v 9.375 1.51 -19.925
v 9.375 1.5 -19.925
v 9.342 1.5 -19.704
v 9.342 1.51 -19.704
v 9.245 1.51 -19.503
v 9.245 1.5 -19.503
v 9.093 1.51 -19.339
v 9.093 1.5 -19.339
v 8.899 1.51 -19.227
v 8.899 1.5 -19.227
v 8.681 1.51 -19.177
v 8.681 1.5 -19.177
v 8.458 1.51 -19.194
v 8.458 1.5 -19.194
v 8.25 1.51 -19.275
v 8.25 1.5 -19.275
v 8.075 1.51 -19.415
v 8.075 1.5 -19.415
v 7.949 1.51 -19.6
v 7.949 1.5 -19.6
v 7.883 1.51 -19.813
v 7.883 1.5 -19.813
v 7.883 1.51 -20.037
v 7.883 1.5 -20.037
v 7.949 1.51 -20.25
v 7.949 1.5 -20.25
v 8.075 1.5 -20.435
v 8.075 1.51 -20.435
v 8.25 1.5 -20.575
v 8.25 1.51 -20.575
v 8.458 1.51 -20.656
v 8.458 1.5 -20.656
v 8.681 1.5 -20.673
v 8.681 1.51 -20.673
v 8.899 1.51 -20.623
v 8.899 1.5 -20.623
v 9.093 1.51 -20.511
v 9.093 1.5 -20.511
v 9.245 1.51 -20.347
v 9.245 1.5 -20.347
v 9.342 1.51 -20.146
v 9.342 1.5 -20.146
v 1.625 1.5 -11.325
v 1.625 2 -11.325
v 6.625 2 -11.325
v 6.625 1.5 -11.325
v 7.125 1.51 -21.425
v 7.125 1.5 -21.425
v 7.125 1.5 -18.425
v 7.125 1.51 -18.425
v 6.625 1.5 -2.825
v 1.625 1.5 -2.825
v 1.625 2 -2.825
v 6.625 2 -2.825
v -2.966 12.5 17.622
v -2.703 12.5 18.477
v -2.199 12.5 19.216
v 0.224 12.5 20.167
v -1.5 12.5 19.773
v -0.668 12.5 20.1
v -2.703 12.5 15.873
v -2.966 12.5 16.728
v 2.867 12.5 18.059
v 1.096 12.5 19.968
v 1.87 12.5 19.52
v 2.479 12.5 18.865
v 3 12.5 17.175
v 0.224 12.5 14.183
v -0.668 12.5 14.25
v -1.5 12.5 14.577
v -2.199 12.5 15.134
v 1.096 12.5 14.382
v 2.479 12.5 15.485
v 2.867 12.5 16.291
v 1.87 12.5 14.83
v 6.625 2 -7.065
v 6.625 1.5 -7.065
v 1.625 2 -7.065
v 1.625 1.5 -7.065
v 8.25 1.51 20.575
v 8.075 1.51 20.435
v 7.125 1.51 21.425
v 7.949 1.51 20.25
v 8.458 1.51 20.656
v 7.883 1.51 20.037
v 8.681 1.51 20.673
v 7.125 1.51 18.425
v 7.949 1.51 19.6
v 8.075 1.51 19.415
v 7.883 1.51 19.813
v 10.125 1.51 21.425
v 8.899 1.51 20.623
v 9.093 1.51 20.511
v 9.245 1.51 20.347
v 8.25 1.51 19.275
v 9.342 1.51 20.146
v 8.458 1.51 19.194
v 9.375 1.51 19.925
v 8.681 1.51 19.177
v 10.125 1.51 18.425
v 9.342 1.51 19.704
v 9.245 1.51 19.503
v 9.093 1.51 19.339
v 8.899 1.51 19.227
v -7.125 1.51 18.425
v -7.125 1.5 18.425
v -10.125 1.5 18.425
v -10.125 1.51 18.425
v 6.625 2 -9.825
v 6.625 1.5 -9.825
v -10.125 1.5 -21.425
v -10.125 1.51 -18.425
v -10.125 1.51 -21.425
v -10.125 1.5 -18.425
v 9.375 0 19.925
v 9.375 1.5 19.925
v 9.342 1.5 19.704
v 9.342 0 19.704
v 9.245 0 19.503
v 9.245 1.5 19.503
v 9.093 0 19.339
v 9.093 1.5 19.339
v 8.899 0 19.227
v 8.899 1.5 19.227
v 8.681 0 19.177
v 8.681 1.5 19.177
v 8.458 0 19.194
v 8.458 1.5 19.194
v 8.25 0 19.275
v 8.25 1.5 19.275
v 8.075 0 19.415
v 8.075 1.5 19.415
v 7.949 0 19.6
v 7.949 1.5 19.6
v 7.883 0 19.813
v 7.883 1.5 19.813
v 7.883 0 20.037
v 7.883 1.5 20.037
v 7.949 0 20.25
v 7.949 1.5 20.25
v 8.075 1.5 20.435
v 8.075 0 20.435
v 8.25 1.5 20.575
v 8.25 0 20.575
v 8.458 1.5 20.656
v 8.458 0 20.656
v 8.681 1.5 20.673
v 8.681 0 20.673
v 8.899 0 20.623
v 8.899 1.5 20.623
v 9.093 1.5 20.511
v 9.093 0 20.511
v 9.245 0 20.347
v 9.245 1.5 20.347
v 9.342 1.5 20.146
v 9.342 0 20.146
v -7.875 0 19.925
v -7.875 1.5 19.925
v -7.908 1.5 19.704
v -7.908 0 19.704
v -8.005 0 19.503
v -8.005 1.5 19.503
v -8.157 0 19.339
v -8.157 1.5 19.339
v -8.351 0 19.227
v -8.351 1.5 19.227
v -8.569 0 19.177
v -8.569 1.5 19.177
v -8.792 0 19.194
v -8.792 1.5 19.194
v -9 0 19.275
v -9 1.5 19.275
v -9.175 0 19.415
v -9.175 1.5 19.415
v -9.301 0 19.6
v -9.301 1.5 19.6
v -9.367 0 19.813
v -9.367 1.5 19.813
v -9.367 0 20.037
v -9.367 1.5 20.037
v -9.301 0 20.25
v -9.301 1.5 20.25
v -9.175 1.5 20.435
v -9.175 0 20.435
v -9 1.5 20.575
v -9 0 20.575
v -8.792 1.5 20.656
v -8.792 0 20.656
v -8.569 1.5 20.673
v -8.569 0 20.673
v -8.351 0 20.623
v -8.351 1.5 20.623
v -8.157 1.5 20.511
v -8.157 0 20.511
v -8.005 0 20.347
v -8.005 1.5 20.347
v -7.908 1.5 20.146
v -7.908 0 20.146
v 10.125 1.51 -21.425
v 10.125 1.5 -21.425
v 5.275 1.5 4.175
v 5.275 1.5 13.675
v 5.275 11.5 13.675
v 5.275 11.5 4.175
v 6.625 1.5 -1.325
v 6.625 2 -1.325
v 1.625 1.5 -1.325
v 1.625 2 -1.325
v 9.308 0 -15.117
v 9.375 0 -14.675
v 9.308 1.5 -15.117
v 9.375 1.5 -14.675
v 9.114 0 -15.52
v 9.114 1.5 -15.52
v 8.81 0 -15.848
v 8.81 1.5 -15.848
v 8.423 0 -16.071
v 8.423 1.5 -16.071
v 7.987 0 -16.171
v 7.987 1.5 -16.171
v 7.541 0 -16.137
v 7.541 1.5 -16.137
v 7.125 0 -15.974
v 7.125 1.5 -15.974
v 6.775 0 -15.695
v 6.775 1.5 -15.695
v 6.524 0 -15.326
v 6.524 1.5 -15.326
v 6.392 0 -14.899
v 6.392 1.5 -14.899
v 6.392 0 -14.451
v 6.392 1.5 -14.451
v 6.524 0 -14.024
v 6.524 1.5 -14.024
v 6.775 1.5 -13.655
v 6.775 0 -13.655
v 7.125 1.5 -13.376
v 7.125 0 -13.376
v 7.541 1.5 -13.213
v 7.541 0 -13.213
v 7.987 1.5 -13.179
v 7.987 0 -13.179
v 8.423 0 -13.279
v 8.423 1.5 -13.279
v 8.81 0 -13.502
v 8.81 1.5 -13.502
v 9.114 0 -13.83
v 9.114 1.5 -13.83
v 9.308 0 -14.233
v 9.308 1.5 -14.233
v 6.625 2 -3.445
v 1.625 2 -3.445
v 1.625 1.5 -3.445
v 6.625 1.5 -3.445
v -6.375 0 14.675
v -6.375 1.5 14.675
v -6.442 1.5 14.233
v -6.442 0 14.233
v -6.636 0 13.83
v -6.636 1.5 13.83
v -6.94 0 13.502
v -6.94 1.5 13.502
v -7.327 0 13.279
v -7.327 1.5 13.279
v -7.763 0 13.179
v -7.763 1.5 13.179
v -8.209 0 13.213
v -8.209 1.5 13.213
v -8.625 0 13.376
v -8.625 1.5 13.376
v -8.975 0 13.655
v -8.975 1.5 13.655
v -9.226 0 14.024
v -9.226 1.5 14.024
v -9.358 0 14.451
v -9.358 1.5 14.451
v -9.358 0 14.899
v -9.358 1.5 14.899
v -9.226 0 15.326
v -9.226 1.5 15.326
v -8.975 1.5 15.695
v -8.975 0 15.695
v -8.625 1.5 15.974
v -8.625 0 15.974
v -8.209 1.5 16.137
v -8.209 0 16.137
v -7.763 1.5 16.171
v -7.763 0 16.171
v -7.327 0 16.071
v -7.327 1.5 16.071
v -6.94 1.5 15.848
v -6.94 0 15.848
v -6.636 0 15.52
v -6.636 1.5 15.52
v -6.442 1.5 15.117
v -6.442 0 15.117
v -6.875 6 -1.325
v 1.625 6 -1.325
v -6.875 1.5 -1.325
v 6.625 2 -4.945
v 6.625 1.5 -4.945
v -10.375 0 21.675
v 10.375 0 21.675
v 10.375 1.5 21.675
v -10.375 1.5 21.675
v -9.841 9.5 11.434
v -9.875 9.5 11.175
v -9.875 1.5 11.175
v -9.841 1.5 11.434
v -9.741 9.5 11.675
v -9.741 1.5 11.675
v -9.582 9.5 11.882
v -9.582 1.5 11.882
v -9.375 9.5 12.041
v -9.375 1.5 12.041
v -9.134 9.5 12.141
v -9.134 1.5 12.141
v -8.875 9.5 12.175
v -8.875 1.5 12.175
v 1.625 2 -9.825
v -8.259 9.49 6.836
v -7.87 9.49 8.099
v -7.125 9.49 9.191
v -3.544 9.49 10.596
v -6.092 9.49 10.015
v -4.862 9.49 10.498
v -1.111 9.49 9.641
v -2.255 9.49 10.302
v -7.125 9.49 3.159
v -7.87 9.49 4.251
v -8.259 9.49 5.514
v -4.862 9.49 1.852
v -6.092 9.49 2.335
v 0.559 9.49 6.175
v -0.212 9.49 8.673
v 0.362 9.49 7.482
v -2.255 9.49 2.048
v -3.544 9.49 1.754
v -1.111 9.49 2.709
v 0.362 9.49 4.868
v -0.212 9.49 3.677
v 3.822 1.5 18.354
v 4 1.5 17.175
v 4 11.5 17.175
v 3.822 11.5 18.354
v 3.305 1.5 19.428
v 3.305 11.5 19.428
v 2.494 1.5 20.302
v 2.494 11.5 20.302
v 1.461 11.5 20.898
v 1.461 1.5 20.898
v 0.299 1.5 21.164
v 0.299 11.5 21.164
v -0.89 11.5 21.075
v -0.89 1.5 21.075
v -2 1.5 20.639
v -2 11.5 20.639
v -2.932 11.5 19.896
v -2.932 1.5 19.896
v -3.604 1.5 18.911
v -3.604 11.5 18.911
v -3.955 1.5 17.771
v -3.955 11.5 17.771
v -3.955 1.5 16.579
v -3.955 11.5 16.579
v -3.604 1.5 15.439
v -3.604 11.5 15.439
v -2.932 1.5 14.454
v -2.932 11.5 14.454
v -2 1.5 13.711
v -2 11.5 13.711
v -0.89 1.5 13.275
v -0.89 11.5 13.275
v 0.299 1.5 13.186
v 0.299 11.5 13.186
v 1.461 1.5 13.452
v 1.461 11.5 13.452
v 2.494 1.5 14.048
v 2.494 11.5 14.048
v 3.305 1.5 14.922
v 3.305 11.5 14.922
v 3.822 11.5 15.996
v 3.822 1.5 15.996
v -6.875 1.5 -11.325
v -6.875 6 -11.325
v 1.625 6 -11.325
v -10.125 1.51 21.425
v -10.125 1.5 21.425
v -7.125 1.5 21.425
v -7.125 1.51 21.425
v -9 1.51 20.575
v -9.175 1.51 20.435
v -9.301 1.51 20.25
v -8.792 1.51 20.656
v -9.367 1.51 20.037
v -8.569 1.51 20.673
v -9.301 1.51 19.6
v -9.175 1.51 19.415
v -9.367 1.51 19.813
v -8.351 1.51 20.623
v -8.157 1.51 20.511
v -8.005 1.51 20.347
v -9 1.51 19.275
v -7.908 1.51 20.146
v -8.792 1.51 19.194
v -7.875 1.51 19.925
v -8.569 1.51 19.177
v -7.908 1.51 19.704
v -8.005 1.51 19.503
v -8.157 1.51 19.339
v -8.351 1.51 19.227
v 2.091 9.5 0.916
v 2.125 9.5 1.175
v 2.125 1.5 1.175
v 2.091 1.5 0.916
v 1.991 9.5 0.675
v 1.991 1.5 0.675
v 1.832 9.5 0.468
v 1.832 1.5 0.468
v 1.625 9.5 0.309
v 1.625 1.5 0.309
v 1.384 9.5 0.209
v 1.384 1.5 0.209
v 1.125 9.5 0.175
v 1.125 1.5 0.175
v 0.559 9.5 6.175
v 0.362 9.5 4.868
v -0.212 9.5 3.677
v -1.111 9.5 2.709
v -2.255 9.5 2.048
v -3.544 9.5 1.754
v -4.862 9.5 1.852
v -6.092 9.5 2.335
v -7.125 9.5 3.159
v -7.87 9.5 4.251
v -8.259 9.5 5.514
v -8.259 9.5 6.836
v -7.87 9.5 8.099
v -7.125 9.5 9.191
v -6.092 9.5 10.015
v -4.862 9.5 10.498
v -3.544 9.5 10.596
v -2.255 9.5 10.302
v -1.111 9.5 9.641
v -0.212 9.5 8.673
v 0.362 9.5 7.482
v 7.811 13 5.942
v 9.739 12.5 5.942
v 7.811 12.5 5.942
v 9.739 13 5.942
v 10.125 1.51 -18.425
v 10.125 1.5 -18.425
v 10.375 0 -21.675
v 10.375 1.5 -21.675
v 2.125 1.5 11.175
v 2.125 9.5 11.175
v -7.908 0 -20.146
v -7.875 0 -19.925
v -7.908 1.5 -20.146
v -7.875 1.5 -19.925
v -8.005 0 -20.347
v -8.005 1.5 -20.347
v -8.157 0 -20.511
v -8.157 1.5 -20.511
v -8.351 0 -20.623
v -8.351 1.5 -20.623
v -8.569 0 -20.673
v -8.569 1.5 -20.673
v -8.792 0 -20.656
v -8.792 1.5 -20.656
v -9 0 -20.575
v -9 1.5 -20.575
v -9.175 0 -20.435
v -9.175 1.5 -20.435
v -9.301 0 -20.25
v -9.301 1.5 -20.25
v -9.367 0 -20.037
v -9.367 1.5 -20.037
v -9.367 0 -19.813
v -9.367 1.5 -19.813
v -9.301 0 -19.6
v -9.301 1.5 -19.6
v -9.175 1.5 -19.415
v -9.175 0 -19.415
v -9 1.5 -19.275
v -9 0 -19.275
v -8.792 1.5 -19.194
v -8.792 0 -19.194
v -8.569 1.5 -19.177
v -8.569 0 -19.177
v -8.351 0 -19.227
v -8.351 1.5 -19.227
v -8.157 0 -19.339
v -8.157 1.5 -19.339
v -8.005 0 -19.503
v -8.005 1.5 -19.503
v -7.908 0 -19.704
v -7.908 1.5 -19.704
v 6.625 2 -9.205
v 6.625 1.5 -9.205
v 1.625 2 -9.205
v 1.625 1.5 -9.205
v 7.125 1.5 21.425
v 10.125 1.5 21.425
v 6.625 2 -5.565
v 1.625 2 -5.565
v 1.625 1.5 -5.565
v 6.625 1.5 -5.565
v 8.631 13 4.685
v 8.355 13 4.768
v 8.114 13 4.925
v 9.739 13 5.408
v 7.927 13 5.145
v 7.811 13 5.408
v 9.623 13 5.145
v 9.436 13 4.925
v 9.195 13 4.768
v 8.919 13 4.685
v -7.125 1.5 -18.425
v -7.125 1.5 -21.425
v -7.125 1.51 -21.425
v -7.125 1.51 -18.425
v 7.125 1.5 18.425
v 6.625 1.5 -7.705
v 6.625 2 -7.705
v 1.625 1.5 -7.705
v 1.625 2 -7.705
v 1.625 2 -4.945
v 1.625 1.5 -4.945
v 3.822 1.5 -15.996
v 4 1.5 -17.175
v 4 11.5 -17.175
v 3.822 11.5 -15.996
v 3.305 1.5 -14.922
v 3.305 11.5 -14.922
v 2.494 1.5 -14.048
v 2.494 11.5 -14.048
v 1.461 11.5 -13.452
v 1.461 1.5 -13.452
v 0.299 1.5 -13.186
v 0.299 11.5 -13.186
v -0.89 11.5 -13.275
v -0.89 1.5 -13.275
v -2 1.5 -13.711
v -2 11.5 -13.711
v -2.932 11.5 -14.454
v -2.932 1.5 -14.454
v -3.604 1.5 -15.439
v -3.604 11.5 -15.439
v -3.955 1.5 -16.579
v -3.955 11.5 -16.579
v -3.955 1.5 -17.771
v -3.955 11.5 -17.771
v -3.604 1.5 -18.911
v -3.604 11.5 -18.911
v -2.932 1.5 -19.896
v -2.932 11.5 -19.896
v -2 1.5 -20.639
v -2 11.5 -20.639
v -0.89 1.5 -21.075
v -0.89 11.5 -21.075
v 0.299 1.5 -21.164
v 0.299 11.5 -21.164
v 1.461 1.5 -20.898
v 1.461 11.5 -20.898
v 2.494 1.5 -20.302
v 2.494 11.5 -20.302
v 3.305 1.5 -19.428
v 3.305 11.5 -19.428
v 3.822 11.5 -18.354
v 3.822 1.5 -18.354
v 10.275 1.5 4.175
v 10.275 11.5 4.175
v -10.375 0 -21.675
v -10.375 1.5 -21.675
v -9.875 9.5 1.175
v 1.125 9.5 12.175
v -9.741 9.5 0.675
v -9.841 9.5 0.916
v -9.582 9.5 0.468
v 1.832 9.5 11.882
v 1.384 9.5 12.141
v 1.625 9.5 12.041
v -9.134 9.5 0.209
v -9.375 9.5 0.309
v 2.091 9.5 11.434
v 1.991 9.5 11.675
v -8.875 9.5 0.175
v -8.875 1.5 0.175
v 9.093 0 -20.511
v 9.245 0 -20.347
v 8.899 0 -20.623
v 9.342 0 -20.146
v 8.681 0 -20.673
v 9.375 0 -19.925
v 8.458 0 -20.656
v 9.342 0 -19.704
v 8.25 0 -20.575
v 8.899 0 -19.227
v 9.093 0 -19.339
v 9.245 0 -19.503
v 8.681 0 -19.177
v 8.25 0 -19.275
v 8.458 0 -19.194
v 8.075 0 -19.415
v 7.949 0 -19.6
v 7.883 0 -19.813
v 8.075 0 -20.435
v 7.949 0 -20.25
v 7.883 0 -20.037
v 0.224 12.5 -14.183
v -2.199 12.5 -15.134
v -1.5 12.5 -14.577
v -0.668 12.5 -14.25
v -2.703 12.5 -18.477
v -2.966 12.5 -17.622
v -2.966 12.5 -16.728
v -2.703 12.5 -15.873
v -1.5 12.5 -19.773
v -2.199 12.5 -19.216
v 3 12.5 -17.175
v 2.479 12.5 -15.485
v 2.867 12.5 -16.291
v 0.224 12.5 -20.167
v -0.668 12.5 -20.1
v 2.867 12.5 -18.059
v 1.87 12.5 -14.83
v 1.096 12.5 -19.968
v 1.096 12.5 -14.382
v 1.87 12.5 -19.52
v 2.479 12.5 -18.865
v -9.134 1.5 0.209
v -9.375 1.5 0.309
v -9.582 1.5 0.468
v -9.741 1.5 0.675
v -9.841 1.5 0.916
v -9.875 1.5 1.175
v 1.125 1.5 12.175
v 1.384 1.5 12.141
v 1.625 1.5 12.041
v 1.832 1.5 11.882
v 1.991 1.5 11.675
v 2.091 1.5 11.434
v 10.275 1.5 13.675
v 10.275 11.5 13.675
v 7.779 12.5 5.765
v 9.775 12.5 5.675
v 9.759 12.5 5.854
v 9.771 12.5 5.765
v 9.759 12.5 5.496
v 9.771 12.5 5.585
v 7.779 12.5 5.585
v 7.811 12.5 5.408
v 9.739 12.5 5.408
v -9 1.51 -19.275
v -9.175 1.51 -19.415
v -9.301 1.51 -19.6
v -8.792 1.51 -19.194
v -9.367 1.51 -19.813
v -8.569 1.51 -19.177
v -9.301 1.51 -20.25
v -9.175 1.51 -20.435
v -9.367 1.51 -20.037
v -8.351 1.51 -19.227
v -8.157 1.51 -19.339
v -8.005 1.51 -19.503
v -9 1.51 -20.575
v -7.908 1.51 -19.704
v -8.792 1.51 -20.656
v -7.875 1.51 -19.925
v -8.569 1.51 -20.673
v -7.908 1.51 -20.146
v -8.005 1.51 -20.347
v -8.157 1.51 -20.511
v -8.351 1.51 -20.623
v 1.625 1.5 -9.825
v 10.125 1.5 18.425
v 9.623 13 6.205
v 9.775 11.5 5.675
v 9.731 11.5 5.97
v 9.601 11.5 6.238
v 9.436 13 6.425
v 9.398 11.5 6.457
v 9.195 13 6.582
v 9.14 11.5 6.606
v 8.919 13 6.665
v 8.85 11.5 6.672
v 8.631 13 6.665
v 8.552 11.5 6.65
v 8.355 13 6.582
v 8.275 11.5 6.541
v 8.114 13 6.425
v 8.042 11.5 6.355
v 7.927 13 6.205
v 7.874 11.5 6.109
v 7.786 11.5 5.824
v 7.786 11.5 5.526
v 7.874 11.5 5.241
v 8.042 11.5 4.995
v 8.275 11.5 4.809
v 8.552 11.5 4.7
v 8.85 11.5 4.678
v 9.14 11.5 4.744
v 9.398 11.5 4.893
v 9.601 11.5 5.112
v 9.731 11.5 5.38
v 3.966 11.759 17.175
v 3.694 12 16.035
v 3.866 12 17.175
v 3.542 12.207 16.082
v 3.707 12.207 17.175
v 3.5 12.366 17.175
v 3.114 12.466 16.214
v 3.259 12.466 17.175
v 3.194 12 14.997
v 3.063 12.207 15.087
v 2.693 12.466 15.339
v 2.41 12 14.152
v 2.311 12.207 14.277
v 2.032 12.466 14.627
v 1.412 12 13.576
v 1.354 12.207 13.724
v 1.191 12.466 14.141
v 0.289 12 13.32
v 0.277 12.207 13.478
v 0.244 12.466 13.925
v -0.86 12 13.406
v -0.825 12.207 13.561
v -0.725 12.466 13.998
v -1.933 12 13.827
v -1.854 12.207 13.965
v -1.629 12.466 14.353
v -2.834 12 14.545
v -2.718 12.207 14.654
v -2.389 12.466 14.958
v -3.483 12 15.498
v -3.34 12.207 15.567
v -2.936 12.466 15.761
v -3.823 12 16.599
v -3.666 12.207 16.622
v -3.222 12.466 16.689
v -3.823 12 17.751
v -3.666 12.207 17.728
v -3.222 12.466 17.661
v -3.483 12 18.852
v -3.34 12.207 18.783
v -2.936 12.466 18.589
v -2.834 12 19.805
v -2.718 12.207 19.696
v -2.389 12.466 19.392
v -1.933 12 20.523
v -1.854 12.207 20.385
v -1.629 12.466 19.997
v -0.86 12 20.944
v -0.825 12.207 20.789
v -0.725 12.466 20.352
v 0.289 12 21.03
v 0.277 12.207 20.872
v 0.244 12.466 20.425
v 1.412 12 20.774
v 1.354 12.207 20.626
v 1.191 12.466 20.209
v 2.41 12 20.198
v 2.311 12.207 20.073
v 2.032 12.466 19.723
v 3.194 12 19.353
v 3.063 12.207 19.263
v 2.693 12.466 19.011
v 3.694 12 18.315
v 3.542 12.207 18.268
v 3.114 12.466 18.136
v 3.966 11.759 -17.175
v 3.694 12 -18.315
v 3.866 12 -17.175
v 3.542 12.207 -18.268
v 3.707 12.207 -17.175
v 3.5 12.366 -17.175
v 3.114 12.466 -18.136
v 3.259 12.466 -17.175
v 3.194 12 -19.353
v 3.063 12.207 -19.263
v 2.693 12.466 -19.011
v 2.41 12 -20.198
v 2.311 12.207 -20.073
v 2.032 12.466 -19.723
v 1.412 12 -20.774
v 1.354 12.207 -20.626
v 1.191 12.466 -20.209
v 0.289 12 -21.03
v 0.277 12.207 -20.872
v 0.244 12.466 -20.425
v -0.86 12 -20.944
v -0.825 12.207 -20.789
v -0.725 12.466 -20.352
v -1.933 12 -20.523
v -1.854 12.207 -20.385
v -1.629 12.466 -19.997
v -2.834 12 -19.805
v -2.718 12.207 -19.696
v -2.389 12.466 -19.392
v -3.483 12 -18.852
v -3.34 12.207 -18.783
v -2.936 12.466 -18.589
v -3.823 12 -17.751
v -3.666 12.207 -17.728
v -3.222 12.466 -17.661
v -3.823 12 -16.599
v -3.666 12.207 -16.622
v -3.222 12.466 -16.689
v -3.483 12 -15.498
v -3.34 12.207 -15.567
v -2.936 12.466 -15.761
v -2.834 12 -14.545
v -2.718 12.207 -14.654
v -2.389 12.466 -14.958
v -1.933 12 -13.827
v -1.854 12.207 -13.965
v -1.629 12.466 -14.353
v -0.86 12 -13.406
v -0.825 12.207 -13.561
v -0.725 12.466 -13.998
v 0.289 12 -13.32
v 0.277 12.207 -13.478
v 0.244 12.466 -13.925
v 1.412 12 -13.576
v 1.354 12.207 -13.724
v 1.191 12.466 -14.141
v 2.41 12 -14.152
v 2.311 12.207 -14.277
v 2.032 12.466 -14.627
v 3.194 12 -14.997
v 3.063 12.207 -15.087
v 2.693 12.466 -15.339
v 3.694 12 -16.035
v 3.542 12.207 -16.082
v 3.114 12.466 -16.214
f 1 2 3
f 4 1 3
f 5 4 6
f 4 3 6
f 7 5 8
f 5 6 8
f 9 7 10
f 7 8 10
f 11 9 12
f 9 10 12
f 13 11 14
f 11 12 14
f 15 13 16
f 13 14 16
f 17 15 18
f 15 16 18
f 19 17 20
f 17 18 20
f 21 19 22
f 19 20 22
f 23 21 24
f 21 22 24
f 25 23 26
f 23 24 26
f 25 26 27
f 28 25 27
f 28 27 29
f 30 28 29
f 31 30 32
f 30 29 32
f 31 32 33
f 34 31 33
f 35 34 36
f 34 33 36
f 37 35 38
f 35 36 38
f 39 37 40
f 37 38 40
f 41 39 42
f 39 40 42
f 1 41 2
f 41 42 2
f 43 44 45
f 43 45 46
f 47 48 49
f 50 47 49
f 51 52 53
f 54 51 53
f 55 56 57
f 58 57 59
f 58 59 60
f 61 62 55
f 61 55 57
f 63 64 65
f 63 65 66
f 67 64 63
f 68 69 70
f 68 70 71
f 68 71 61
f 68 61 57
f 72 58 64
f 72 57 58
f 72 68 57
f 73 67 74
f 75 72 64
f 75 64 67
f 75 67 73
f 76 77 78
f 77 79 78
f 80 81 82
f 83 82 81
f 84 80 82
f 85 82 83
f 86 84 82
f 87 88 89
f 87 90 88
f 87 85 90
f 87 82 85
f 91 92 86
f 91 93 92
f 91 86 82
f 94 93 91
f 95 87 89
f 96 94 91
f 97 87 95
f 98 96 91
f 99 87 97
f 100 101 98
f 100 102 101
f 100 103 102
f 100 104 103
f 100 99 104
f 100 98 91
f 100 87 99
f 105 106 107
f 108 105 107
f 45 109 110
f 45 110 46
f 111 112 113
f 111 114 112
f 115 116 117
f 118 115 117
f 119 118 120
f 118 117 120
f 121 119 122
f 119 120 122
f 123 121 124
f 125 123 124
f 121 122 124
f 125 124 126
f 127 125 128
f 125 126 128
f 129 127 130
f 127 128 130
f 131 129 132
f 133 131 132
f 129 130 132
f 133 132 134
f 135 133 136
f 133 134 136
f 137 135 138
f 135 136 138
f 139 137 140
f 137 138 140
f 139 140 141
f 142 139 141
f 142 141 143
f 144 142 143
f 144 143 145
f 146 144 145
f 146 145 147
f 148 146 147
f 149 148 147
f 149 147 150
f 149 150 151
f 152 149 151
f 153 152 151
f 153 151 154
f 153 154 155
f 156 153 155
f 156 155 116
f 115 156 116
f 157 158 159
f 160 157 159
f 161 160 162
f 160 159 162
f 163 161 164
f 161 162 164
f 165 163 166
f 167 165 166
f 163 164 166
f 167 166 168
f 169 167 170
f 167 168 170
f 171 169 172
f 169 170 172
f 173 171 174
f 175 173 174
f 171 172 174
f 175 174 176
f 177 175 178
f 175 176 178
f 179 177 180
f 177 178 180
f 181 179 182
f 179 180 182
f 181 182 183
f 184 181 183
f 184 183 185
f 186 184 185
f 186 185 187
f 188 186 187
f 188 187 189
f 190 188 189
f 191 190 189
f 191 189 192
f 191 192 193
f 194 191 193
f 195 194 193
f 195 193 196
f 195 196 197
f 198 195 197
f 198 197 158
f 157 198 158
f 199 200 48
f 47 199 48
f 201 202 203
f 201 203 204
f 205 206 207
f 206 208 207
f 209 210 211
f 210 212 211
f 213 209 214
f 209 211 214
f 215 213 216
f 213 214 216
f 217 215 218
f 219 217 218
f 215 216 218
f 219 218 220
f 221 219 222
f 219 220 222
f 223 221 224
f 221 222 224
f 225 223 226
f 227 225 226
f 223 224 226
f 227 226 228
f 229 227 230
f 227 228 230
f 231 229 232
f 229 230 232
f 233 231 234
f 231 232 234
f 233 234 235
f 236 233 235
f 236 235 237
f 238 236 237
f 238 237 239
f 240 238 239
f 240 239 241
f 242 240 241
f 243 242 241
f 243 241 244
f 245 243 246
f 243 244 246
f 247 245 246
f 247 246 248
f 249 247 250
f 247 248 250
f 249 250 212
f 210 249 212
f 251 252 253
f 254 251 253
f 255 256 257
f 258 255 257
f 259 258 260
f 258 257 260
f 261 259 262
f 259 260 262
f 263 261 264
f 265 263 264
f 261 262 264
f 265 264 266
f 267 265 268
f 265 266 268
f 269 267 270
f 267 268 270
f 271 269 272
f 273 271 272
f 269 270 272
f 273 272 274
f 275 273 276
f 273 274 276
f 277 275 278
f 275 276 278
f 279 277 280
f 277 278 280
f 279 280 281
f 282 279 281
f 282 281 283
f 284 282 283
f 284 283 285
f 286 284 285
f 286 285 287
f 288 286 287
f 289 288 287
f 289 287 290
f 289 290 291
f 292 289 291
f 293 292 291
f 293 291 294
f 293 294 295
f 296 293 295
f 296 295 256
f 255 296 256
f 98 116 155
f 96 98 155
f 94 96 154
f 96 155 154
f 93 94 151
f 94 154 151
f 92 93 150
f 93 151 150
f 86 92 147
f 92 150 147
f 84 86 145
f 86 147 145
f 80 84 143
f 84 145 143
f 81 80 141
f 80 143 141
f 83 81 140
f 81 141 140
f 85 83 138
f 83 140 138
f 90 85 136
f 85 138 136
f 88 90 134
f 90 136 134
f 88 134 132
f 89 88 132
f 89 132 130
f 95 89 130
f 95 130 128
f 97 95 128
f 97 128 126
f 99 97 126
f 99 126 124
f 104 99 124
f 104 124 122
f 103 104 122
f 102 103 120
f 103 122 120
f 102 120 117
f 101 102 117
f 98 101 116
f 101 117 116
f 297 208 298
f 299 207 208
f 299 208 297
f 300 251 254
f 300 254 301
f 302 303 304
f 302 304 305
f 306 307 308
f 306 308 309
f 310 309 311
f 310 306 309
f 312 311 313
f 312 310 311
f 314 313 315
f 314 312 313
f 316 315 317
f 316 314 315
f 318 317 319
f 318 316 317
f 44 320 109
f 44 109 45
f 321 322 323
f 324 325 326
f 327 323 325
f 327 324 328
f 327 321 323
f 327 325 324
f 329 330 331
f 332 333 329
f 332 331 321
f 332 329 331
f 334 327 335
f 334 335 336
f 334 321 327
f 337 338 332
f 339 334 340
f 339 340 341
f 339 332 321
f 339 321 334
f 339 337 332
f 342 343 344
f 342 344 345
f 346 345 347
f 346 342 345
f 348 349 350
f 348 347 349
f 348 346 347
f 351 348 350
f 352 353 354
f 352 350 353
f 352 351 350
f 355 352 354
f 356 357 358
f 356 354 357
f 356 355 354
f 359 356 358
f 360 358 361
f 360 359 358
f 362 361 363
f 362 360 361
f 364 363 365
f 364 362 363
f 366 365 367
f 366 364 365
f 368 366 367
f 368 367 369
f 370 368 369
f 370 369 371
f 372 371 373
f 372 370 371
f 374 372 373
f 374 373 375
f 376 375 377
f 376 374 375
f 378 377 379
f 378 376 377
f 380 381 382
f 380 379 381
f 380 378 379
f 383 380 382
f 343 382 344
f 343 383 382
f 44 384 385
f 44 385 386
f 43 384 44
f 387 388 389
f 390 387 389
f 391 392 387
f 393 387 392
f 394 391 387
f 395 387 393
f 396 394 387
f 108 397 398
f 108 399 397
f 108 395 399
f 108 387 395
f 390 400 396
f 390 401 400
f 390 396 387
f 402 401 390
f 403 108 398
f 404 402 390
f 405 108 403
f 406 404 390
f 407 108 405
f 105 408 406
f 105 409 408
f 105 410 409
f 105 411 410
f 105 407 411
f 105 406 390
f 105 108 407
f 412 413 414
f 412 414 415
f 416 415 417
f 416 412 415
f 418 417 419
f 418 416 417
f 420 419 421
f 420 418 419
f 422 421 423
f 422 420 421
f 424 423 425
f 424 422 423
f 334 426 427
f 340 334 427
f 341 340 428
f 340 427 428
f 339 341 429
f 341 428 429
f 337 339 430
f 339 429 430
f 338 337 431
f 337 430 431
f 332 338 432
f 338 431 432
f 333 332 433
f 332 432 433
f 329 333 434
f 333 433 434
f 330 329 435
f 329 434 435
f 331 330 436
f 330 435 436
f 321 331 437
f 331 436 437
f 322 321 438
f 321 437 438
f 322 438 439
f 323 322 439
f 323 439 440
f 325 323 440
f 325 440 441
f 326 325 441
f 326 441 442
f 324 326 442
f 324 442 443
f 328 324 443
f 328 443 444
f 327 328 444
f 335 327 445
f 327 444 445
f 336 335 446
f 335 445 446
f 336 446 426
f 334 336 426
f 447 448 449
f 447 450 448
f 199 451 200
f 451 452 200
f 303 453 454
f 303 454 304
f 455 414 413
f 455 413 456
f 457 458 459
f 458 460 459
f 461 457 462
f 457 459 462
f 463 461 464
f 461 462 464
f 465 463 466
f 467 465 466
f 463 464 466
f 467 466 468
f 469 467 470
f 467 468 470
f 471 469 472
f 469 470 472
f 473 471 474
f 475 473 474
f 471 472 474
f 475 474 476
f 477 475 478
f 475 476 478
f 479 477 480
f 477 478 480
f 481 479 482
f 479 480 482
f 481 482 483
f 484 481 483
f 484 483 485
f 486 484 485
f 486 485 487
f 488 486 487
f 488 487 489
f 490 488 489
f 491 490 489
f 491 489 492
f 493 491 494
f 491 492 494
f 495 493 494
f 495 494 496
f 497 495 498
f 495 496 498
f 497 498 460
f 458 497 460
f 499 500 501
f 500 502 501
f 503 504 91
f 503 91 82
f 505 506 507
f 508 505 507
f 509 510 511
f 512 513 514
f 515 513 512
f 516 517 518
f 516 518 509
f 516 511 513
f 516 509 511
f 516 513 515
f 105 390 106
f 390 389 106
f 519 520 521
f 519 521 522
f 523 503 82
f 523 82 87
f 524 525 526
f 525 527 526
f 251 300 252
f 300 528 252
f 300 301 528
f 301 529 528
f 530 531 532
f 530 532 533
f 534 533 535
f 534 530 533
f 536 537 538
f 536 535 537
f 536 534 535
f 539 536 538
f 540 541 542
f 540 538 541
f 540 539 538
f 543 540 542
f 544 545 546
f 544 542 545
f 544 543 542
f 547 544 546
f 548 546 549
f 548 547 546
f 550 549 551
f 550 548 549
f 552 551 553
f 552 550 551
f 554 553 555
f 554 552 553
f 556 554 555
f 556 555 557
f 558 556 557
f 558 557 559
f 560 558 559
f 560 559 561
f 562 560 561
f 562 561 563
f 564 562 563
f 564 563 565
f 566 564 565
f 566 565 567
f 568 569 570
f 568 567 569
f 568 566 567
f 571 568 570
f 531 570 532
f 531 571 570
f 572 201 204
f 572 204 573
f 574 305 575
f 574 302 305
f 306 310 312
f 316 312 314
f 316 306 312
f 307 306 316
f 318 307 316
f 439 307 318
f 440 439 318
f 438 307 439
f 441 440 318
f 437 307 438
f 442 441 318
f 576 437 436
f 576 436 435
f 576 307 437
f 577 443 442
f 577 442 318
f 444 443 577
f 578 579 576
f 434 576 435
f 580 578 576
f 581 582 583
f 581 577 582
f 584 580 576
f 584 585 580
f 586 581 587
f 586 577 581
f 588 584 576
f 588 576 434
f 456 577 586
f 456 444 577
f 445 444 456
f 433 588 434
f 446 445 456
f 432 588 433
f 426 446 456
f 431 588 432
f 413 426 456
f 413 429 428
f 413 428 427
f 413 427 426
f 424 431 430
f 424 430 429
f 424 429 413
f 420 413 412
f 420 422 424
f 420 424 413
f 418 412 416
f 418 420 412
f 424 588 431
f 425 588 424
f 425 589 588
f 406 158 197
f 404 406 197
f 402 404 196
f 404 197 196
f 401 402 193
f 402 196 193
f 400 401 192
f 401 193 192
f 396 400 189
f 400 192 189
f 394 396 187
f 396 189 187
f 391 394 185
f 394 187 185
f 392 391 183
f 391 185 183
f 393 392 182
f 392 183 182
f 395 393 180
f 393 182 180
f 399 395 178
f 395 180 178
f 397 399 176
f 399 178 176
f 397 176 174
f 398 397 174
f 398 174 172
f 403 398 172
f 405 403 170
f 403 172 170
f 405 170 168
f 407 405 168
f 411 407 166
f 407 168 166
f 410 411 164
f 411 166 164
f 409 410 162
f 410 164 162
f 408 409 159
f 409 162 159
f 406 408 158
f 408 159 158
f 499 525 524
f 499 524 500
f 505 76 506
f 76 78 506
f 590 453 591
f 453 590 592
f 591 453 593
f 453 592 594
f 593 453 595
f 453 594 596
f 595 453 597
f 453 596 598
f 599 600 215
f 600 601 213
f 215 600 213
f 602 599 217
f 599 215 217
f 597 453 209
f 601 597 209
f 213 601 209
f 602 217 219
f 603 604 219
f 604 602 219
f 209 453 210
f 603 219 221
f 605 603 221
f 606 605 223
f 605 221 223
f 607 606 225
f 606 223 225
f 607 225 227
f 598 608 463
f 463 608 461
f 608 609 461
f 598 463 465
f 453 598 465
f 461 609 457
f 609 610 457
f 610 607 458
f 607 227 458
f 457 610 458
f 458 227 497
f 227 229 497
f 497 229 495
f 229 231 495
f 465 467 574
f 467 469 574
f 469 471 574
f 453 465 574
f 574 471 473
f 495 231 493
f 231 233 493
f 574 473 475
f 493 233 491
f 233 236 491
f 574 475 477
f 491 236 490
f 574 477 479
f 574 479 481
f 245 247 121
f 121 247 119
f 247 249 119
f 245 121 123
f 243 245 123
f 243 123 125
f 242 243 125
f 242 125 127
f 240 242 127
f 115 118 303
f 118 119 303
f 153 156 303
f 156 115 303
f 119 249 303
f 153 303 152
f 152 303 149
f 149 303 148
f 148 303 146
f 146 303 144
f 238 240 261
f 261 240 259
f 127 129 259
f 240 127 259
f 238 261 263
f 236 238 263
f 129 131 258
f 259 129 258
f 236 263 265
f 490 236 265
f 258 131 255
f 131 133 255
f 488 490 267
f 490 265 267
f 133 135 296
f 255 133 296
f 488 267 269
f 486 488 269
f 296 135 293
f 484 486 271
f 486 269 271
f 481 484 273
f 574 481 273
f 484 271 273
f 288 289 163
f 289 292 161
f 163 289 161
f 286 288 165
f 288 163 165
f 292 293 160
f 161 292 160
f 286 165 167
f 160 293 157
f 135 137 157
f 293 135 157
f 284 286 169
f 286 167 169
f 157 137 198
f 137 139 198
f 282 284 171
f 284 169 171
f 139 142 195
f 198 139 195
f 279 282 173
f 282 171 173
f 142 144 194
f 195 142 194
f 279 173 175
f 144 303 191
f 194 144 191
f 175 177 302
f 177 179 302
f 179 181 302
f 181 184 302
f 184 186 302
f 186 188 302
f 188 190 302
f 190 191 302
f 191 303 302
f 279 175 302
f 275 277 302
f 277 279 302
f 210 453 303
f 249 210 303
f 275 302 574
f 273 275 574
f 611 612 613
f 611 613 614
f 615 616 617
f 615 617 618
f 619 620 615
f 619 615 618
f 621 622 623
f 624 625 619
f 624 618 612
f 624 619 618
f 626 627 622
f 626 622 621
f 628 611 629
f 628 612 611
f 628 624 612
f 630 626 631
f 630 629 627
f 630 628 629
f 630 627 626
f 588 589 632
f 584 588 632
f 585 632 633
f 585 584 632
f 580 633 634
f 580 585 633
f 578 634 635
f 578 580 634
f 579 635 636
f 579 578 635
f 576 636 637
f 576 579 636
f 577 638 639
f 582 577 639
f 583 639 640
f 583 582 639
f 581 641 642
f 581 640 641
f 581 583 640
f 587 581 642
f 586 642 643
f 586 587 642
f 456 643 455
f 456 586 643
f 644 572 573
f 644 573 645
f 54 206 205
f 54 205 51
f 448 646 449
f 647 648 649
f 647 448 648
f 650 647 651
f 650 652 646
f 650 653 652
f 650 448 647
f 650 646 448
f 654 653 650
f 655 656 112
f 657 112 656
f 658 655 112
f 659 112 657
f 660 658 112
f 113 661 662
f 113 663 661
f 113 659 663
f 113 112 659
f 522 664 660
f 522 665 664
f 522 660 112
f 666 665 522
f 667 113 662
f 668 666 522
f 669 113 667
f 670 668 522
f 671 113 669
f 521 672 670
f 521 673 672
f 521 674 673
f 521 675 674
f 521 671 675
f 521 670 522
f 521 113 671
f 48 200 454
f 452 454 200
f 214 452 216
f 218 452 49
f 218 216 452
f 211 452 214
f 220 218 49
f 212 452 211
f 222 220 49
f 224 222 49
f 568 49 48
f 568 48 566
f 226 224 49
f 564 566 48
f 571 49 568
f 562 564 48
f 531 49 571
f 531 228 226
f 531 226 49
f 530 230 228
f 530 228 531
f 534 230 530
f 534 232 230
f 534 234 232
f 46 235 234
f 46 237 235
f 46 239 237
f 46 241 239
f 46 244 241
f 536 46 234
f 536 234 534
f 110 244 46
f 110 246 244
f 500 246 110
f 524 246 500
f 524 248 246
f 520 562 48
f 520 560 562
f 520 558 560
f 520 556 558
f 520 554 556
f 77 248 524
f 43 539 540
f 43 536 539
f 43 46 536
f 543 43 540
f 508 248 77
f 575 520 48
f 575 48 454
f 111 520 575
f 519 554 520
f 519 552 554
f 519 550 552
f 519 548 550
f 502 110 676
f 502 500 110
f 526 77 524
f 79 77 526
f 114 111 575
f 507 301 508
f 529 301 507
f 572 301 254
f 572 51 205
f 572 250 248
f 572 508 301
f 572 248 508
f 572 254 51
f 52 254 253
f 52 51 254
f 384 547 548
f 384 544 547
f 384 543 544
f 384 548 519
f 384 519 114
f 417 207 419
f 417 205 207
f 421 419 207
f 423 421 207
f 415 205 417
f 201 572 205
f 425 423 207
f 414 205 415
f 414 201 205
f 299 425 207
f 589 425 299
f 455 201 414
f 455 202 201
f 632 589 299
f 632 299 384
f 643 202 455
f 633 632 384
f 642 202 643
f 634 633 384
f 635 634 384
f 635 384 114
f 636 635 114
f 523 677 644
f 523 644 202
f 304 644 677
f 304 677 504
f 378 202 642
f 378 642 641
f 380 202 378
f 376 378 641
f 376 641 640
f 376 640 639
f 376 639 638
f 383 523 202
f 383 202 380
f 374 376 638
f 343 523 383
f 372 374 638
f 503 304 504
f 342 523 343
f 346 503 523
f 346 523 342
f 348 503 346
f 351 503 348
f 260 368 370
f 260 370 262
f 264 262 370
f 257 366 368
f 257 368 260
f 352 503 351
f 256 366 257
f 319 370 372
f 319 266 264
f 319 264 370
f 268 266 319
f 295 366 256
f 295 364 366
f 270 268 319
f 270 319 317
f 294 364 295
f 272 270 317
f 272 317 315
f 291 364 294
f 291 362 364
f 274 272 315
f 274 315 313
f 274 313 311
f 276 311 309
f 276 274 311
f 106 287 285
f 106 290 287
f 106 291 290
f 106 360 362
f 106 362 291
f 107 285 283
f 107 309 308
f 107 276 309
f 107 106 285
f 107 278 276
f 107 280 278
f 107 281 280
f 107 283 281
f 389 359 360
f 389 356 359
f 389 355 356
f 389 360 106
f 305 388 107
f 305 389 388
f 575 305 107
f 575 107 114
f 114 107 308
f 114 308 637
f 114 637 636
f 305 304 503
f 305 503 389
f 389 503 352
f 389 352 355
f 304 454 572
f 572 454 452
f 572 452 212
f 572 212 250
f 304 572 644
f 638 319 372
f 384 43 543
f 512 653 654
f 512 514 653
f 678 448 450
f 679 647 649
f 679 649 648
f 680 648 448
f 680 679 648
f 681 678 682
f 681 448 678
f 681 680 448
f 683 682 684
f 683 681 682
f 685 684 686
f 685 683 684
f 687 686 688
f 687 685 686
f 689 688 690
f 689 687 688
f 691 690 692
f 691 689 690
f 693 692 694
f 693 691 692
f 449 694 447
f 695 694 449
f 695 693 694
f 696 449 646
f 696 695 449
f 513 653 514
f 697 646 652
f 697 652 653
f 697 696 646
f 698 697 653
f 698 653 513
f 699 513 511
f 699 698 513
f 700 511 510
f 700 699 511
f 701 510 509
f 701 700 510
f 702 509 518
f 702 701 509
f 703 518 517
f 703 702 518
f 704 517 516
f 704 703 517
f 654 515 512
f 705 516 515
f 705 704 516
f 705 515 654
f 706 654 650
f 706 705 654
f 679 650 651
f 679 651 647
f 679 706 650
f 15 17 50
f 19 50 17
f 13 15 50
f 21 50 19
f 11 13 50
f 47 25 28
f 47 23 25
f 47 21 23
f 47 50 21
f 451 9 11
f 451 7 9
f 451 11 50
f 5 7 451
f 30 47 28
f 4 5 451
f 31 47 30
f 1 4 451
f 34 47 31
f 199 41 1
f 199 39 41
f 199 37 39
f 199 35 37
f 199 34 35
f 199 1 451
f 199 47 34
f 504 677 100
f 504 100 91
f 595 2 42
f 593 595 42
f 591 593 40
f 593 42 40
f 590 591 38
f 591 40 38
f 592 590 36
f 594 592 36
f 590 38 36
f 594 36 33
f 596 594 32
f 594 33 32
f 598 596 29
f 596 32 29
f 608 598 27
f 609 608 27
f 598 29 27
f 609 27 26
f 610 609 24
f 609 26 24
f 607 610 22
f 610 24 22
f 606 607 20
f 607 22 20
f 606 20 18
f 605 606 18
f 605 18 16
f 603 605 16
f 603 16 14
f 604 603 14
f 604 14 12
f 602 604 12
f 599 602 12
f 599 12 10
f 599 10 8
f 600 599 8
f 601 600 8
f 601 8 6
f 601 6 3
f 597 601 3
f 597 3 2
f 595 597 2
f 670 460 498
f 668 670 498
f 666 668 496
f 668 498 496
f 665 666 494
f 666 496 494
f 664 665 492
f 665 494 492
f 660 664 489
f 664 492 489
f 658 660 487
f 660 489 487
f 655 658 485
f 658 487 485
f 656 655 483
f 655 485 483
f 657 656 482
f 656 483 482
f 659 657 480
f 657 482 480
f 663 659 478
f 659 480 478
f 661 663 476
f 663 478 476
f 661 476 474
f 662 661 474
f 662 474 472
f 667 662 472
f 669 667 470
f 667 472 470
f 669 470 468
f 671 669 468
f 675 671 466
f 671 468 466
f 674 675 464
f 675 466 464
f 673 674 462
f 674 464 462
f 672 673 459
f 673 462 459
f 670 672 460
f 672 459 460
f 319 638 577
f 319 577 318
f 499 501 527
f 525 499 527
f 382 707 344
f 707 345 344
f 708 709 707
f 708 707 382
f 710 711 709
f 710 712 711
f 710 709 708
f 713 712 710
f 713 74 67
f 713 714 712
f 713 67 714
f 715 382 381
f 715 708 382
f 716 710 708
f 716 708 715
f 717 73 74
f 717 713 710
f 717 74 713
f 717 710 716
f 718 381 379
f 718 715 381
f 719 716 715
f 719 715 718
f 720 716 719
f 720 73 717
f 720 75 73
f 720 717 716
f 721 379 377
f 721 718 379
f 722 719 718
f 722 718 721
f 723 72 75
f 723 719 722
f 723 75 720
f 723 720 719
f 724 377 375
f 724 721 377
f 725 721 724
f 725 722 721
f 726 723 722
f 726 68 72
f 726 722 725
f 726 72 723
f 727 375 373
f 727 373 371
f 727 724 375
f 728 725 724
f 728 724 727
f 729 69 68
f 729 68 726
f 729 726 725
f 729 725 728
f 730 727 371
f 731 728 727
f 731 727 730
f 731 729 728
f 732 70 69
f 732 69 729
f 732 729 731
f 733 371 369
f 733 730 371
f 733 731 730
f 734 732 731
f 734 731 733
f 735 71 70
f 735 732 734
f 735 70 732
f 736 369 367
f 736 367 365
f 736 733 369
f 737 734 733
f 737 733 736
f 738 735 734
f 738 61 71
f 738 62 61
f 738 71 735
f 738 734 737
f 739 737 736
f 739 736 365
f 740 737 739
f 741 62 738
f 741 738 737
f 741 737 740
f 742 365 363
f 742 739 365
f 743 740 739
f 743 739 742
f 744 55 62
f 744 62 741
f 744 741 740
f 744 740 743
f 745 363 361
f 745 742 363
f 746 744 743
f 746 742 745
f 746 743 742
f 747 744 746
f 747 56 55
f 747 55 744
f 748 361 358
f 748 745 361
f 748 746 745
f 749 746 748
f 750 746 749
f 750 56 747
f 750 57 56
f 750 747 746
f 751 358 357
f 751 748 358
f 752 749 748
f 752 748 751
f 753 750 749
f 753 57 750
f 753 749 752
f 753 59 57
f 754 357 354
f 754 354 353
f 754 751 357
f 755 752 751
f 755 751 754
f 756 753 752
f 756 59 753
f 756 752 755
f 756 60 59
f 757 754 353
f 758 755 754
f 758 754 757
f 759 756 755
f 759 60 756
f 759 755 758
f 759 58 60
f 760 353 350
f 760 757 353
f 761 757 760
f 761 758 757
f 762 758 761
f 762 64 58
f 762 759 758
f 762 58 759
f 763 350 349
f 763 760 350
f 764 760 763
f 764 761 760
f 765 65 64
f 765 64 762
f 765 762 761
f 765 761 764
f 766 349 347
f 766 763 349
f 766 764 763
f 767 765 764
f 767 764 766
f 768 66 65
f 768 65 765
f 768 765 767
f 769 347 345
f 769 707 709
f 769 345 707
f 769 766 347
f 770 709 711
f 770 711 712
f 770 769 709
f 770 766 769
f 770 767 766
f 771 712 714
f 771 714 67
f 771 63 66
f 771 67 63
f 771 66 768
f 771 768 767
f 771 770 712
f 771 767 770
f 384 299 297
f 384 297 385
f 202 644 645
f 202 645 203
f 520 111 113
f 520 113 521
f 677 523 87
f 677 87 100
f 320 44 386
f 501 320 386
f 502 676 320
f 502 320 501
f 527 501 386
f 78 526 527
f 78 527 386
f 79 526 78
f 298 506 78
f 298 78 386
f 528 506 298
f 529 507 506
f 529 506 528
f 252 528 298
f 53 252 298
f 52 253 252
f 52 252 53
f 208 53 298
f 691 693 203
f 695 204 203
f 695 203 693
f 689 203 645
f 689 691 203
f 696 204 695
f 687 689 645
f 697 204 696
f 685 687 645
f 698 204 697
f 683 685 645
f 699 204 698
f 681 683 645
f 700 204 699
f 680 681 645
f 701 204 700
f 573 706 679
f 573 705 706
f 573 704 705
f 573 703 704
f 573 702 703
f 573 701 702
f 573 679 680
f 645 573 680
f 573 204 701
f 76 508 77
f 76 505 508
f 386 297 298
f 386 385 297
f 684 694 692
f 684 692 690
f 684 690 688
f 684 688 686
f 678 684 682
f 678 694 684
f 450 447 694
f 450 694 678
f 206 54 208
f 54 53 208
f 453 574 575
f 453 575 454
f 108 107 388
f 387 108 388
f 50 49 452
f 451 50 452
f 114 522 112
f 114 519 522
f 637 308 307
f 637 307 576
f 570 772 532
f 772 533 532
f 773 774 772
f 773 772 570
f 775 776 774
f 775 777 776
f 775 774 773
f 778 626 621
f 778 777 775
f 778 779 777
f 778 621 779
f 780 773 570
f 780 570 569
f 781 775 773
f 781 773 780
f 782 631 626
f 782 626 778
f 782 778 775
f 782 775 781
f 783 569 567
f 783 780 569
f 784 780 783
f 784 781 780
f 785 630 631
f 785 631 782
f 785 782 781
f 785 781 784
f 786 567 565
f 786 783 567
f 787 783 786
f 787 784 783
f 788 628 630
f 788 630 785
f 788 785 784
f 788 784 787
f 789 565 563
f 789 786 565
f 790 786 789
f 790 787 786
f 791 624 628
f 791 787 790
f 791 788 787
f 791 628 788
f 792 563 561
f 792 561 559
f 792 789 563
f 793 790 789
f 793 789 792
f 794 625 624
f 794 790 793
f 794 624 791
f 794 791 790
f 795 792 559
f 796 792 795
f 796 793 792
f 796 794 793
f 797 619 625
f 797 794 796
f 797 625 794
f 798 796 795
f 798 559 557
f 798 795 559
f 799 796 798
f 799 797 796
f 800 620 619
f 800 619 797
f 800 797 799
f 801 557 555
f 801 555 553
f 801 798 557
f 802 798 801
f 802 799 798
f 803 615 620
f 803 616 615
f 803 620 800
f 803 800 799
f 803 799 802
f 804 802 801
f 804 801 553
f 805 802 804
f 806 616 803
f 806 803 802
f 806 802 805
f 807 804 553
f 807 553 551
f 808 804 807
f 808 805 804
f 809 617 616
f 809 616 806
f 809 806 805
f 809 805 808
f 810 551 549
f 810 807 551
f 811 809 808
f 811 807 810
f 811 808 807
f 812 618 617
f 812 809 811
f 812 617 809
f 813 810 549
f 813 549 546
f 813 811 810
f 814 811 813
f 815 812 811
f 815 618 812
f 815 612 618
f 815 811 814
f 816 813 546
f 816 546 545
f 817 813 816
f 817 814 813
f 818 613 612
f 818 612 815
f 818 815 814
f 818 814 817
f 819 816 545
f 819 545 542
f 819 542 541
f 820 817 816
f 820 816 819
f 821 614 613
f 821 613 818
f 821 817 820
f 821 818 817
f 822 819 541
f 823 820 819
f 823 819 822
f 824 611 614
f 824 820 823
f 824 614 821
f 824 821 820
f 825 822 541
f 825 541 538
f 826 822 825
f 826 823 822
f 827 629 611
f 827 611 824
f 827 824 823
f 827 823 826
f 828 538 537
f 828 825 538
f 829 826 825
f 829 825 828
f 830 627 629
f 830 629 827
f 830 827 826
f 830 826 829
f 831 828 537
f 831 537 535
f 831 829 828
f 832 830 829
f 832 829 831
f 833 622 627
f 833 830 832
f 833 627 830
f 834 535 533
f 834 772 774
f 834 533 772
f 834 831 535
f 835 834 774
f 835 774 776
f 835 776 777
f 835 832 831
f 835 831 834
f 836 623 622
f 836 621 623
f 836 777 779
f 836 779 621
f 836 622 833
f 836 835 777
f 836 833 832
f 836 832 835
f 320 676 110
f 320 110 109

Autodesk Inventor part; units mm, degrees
ref_plane "YZ Plane" through (0, 0, 0) normal (1, 0, 0) x (0, 1, 0)
ref_plane "XZ Plane" through (0, 0, 0) normal (0, 1, 0) x (-1, 0, 0)
ref_plane "XY Plane" through (0, 0, 0) normal (0, 0, 1) x (1, 0, 0)
sketch "Sketch1" plane through (0, 0, 0) normal (0, 1, 0) x (-1, 0, 0)
  line L0 (-10.375, 21.675) -> (10.375, 21.675)
  line L1 (10.375, 21.675) -> (10.375, -21.675)
  line L2 (10.375, -21.675) -> (-10.375, -21.675)
  line L3 (-10.375, -21.675) -> (-10.375, 21.675)
  line L4 (-10.375, 21.675) -> (10.375, -21.675) construction
  line L5 (10.375, 21.675) -> (-10.375, -21.675) construction
  point P0 (0, 0)
  dimension "d0" = 20.75
  dimension "d1" = 43.35
extrude "Extrusion1" add sketch "Sketch1" along normal blind 1.5
sketch "Sketch2" plane through (0, 1.5, 0) normal (0, 1, 0) x (1, 0, 0)
  circle A0 centre (-8.625, -19.925) radius 0.75
  circle A1 centre (-8.625, 19.925) radius 0.75
  circle A2 centre (8.625, -19.925) radius 0.75
  circle A3 centre (8.625, 19.925) radius 0.75
  line L0 (-10.375, -21.675) -> (10.375, -21.675) projected
  line L1 (10.375, -21.675) -> (10.375, 21.675) projected
  line L2 (-10.375, 21.675) -> (-10.375, -21.675) projected
  line L3 (10.375, 21.675) -> (-10.375, 21.675) projected
  point P0 (0, 0)
  dimension "d4" = 1.5
  dimension "d5" = 1.5
  dimension "d6" = 1.5
  dimension "d7" = 1.5
  dimension "d8" = 1.75
  dimension "d9" = 1.75
  dimension "d10" = 1.75
  dimension "d11" = 1.75
  dimension "d12" = 1.75
  dimension "d13" = 1.75
  dimension "d14" = 1.75
  dimension "d15" = 1.75
extrude "Extrusion2" cut sketch "Sketch2" against normal up to next contours A0 | A1 | A2 | A3
sketch "Sketch3" plane through (0, 1.5, 0) normal (0, 1, 0) x (1, 0, 0)
  circle A0 centre (7.875, 14.675) radius 1.5
  circle A1 centre (-7.875, -14.675) radius 1.5
  line L0 (-10.375, 21.675) -> (-10.375, -21.675) projected
  line L1 (10.375, 21.675) -> (10.375, -21.675) projected
  line L2 (10.375, 21.675) -> (-10.375, 21.675) projected
  line L3 (-10.375, -21.675) -> (10.375, -21.675) projected
  point P0 (0, 0)
  dimension "d18" = 3
  dimension "d19" = 3
  dimension "d20" = 2.5
  dimension "d21" = 2.5
  dimension "d22" = 7
  dimension "d23" = 7
extrude "Extrusion3" cut sketch "Sketch3" against normal up to next contours A0 | A1
sketch "Sketch4" plane through (0, 1.5, 0) normal (0, 1, 0) x (1, 0, 0)
  line L0 (-7.125, -18.425) -> (-10.125, -18.425)
  line L1 (-10.125, -18.425) -> (-10.125, -21.425)
  line L2 (-10.125, -21.425) -> (-7.125, -21.425)
  line L3 (-7.125, -21.425) -> (-7.125, -18.425)
  circle A0 centre (-8.625, -19.925) radius 0.75 projected
  line L4 (-7.125, -18.425) -> (-10.125, -21.425) construction
  line L5 (-10.125, -18.425) -> (-7.125, -21.425) construction
  line L6 (10.125, -21.425) -> (7.125, -21.425)
  line L7 (7.125, -21.425) -> (7.125, -18.425)
  line L8 (7.125, -18.425) -> (10.125, -18.425)
  line L9 (10.125, -18.425) -> (10.125, -21.425)
  circle A1 centre (8.625, -19.925) radius 0.75 projected
  line L10 (10.125, -21.425) -> (7.125, -18.425) construction
  line L11 (7.125, -21.425) -> (10.125, -18.425) construction
  line L12 (7.125, 18.425) -> (10.125, 18.425)
  line L13 (10.125, 18.425) -> (10.125, 21.425)
  line L14 (10.125, 21.425) -> (7.125, 21.425)
  line L15 (7.125, 21.425) -> (7.125, 18.425)
  circle A2 centre (8.625, 19.925) radius 0.75 projected
  line L16 (7.125, 18.425) -> (10.125, 21.425) construction
  line L17 (10.125, 18.425) -> (7.125, 21.425) construction
  line L18 (-10.125, 21.425) -> (-7.125, 21.425)
  line L19 (-7.125, 21.425) -> (-7.125, 18.425)
  line L20 (-7.125, 18.425) -> (-10.125, 18.425)
  line L21 (-10.125, 18.425) -> (-10.125, 21.425)
  circle A3 centre (-8.625, 19.925) radius 0.75 projected
  line L22 (-10.125, 21.425) -> (-7.125, 18.425) construction
  line L23 (-7.125, 21.425) -> (-10.125, 18.425) construction
  circle A4 centre (-8.625, -19.925) radius 0.75
  circle A5 centre (8.625, -19.925) radius 0.75
  circle A6 centre (-8.625, 19.925) radius 0.75
  circle A7 centre (8.625, 19.925) radius 0.75
  point P0 (0, 0)
  dimension "d26" = 3
  dimension "d27" = 3
  dimension "d28" = 3
  dimension "d29" = 3
  dimension "d30" = 3
  dimension "d31" = 3
  dimension "d32" = 3
  dimension "d33" = 3
extrude "Extrusion4" add sketch "Sketch4" along normal blind 0.01
sketch "Sketch5" plane through (0, 1.5, 0) normal (0, 1, 0) x (1, 0, 0)
  circle A0 centre (0, 17.175) radius 4
  line L0 (10.375, 21.675) -> (-10.375, 21.675) projected
  point P0 (0, 0)
  dimension "d36" = 8
  dimension "d37" = 4.5
extrude "Extrusion5" add sketch "Sketch5" along normal blind 11
sketch "Sketch6" plane through (0, 1.5, 0) normal (0, 1, 0) x (1, 0, 0)
  circle A0 centre (0, -17.175) radius 4
  line L0 (-10.375, -21.675) -> (10.375, -21.675) projected
  point P0 (0, 0)
  dimension "d40" = 8
  dimension "d41" = 4.5
extrude "Extrusion6" add sketch "Sketch6" along normal blind 11
sketch "Sketch7" plane through (0, 1.5, 0) normal (0, 1, 0) x (1, 0, 0)
  line L0 (2.125, -12.175) -> (-9.875, -12.175)
  line L1 (-9.875, -12.175) -> (-9.875, -0.175)
  line L2 (-9.875, -0.175) -> (2.125, -0.175)
  line L3 (2.125, -0.175) -> (2.125, -12.175)
  line L4 (2.125, -12.175) -> (-9.875, -0.175) construction
  line L5 (-9.875, -12.175) -> (2.125, -0.175) construction
  line L6 (-10.375, 21.675) -> (-10.375, -21.675) projected
  circle A0 centre (0, -17.175) radius 4 projected
  point P0 (0, 0)
  point P1 (-3.875, -6.175)
  dimension "d44" = 12
  dimension "d45" = 12
  dimension "d46" = 0.5
  dimension "d47" = 5
extrude "Extrusion7" add sketch "Sketch7" along normal blind 8 contours L0 L1 L2 L3
sketch "Sketch8" plane through (0, 9.5, 0) normal (0, 1, 0) x (1, 0, 0)
  line L0 (2.125, -12.175) -> (-9.875, -12.175) projected
  line L1 (-9.875, -12.175) -> (2.125, -0.175)
  circle A0 centre (-3.875, -6.175) radius 4.4338
  point P0 (0, 0)
extrude "Extrusion8" cut sketch "Sketch8" against normal blind 0.01
sketch "Sketch9" plane through (0, 1.5, 0) normal (0, 1, 0) x (1, 0, 0)
  line L0 (10.275, -13.675) -> (5.275, -13.675)
  line L1 (5.275, -13.675) -> (5.275, -4.175)
  line L2 (5.275, -4.175) -> (10.275, -4.175)
  line L3 (10.275, -4.175) -> (10.275, -13.675)
  line L4 (10.275, -13.675) -> (5.275, -4.175) construction
  line L5 (5.275, -13.675) -> (10.275, -4.175) construction
  line L6 (-10.375, -21.675) -> (10.375, -21.675) projected
  line L7 (10.375, 21.675) -> (10.375, -21.675) projected
  point P0 (0, 0)
  point P1 (7.775, -8.925)
  dimension "d52" = 5
  dimension "d53" = 9.5
  dimension "d54" = 8
  dimension "d55" = 0.1
extrude "Extrusion9" add sketch "Sketch9" along normal blind 10
sketch "Sketch10" plane through (0, 11.5, 0) normal (0, 1, 0) x (1, 0, 0)
  circle A0 centre (8.775, -5.675) radius 1
  line L0 (10.275, -4.175) -> (5.275, -4.175) projected
  line L1 (10.275, -13.675) -> (10.275, -4.175) projected
  point P0 (0, 0)
  dimension "d58" = 2
  dimension "d59" = 1.5
  dimension "d60" = 1.5
extrude "Extrusion10" add sketch "Sketch10" along normal blind 1.5
sketch "Sketch11" plane through (8.775, 13, 5.675) normal (0, 1, 0) x (1, 0, 0)
  line L0 (1.224, -0.2665) -> (-1.224, -0.2665)
  line L1 (-1.224, -0.2665) -> (-1.224, 0.2665)
  line L2 (-1.224, 0.2665) -> (1.224, 0.2665)
  line L3 (1.224, 0.2665) -> (1.224, -0.2665)
  line L4 (1.224, -0.2665) -> (-1.224, 0.2665) construction
  line L5 (-1.224, -0.2665) -> (1.224, 0.2665) construction
  point P0 (-8.775, 5.675)
  point P1 (0, 0)
extrude "Extrusion11" cut sketch "Sketch11" against normal blind 0.5
sketch "Sketch12" plane through (0, 1.5, 0) normal (0, 1, 0) x (1, 0, 0)
  line L0 (1.625, 1.325) -> (-6.875, 1.325)
  line L1 (-6.875, 1.325) -> (-6.875, 11.325)
  line L2 (-6.875, 11.325) -> (1.625, 11.325)
  line L3 (1.625, 11.325) -> (1.625, 1.325)
  line L4 (1.625, 1.325) -> (-6.875, 11.325) construction
  line L5 (-6.875, 1.325) -> (1.625, 11.325) construction
  line L6 (-10.375, 21.675) -> (-10.375, -21.675) projected
  line L7 (2.125, -0.175) -> (-9.875, -0.175) projected
  point P0 (0, 0)
  point P1 (-2.625, 6.325)
  dimension "d65" = 8.5
  dimension "d66" = 10
  dimension "d67" = 3.5
  dimension "d68" = 1.5
extrude "Extrusion12" add sketch "Sketch12" along normal blind 4.5
sketch "Sketch13" plane through (1.625, 1.5, -1.325) normal (1, 0, 0) x (0, 0, -1)
  line L0 (10, 0) -> (0, 0) projected
  line L1 (0, 0) -> (1.5, 0)
  line L2 (1.5, 0) -> (1.5, 0.5)
  line L3 (1.5, 0.5) -> (0, 0.5)
  line L4 (0, 0.5) -> (0, 0)
  line L5 (10, 0) -> (8.5, 0)
  line L6 (8.5, 0) -> (8.5, 0.5)
  line L7 (8.5, 0.5) -> (10, 0.5)
  line L8 (10, 0.5) -> (10, 0)
  line L9 (2.12, 0) -> (3.62, 0)
  line L10 (3.62, 0) -> (3.62, 0.5)
  line L11 (3.62, 0.5) -> (2.12, 0.5)
  line L12 (2.12, 0.5) -> (2.12, 0)
  line L13 (6.38, 0) -> (7.88, 0)
  line L14 (7.88, 0) -> (7.88, 0.5)
  line L15 (7.88, 0.5) -> (6.38, 0.5)
  line L16 (6.38, 0.5) -> (6.38, 0)
  line L17 (4.24, 0) -> (5.74, 0)
  line L18 (5.74, 0) -> (5.74, 0.5)
  line L19 (5.74, 0.5) -> (4.24, 0.5)
  line L20 (4.24, 0.5) -> (4.24, 0)
  point P0 (-1.325, -1.5)
  dimension "d71" = 1.5
  dimension "d72" = 0.5
  dimension "d73" = 1.5
  dimension "d74" = 0.5
  dimension "d75" = 1.5
  dimension "d76" = 1.5
  dimension "d77" = 0.5
  dimension "d78" = 0.62
  dimension "d79" = 0.62
  dimension "d80" = 1.5
  dimension "d81" = 0.62
extrude "Extrusion13" add sketch "Sketch13" along normal blind 5
fillet "Fillet1" radius 1 6 edges at (2.125, 5.5, 12.175) (2.125, 5.5, 0.175) (-9.875, 5.5, 12.175) (-9.875, 5.5, 0.175) (-4, 12.5, 17.175) (-4, 12.5, -17.175)
properties part number "pcb_with_elements"
